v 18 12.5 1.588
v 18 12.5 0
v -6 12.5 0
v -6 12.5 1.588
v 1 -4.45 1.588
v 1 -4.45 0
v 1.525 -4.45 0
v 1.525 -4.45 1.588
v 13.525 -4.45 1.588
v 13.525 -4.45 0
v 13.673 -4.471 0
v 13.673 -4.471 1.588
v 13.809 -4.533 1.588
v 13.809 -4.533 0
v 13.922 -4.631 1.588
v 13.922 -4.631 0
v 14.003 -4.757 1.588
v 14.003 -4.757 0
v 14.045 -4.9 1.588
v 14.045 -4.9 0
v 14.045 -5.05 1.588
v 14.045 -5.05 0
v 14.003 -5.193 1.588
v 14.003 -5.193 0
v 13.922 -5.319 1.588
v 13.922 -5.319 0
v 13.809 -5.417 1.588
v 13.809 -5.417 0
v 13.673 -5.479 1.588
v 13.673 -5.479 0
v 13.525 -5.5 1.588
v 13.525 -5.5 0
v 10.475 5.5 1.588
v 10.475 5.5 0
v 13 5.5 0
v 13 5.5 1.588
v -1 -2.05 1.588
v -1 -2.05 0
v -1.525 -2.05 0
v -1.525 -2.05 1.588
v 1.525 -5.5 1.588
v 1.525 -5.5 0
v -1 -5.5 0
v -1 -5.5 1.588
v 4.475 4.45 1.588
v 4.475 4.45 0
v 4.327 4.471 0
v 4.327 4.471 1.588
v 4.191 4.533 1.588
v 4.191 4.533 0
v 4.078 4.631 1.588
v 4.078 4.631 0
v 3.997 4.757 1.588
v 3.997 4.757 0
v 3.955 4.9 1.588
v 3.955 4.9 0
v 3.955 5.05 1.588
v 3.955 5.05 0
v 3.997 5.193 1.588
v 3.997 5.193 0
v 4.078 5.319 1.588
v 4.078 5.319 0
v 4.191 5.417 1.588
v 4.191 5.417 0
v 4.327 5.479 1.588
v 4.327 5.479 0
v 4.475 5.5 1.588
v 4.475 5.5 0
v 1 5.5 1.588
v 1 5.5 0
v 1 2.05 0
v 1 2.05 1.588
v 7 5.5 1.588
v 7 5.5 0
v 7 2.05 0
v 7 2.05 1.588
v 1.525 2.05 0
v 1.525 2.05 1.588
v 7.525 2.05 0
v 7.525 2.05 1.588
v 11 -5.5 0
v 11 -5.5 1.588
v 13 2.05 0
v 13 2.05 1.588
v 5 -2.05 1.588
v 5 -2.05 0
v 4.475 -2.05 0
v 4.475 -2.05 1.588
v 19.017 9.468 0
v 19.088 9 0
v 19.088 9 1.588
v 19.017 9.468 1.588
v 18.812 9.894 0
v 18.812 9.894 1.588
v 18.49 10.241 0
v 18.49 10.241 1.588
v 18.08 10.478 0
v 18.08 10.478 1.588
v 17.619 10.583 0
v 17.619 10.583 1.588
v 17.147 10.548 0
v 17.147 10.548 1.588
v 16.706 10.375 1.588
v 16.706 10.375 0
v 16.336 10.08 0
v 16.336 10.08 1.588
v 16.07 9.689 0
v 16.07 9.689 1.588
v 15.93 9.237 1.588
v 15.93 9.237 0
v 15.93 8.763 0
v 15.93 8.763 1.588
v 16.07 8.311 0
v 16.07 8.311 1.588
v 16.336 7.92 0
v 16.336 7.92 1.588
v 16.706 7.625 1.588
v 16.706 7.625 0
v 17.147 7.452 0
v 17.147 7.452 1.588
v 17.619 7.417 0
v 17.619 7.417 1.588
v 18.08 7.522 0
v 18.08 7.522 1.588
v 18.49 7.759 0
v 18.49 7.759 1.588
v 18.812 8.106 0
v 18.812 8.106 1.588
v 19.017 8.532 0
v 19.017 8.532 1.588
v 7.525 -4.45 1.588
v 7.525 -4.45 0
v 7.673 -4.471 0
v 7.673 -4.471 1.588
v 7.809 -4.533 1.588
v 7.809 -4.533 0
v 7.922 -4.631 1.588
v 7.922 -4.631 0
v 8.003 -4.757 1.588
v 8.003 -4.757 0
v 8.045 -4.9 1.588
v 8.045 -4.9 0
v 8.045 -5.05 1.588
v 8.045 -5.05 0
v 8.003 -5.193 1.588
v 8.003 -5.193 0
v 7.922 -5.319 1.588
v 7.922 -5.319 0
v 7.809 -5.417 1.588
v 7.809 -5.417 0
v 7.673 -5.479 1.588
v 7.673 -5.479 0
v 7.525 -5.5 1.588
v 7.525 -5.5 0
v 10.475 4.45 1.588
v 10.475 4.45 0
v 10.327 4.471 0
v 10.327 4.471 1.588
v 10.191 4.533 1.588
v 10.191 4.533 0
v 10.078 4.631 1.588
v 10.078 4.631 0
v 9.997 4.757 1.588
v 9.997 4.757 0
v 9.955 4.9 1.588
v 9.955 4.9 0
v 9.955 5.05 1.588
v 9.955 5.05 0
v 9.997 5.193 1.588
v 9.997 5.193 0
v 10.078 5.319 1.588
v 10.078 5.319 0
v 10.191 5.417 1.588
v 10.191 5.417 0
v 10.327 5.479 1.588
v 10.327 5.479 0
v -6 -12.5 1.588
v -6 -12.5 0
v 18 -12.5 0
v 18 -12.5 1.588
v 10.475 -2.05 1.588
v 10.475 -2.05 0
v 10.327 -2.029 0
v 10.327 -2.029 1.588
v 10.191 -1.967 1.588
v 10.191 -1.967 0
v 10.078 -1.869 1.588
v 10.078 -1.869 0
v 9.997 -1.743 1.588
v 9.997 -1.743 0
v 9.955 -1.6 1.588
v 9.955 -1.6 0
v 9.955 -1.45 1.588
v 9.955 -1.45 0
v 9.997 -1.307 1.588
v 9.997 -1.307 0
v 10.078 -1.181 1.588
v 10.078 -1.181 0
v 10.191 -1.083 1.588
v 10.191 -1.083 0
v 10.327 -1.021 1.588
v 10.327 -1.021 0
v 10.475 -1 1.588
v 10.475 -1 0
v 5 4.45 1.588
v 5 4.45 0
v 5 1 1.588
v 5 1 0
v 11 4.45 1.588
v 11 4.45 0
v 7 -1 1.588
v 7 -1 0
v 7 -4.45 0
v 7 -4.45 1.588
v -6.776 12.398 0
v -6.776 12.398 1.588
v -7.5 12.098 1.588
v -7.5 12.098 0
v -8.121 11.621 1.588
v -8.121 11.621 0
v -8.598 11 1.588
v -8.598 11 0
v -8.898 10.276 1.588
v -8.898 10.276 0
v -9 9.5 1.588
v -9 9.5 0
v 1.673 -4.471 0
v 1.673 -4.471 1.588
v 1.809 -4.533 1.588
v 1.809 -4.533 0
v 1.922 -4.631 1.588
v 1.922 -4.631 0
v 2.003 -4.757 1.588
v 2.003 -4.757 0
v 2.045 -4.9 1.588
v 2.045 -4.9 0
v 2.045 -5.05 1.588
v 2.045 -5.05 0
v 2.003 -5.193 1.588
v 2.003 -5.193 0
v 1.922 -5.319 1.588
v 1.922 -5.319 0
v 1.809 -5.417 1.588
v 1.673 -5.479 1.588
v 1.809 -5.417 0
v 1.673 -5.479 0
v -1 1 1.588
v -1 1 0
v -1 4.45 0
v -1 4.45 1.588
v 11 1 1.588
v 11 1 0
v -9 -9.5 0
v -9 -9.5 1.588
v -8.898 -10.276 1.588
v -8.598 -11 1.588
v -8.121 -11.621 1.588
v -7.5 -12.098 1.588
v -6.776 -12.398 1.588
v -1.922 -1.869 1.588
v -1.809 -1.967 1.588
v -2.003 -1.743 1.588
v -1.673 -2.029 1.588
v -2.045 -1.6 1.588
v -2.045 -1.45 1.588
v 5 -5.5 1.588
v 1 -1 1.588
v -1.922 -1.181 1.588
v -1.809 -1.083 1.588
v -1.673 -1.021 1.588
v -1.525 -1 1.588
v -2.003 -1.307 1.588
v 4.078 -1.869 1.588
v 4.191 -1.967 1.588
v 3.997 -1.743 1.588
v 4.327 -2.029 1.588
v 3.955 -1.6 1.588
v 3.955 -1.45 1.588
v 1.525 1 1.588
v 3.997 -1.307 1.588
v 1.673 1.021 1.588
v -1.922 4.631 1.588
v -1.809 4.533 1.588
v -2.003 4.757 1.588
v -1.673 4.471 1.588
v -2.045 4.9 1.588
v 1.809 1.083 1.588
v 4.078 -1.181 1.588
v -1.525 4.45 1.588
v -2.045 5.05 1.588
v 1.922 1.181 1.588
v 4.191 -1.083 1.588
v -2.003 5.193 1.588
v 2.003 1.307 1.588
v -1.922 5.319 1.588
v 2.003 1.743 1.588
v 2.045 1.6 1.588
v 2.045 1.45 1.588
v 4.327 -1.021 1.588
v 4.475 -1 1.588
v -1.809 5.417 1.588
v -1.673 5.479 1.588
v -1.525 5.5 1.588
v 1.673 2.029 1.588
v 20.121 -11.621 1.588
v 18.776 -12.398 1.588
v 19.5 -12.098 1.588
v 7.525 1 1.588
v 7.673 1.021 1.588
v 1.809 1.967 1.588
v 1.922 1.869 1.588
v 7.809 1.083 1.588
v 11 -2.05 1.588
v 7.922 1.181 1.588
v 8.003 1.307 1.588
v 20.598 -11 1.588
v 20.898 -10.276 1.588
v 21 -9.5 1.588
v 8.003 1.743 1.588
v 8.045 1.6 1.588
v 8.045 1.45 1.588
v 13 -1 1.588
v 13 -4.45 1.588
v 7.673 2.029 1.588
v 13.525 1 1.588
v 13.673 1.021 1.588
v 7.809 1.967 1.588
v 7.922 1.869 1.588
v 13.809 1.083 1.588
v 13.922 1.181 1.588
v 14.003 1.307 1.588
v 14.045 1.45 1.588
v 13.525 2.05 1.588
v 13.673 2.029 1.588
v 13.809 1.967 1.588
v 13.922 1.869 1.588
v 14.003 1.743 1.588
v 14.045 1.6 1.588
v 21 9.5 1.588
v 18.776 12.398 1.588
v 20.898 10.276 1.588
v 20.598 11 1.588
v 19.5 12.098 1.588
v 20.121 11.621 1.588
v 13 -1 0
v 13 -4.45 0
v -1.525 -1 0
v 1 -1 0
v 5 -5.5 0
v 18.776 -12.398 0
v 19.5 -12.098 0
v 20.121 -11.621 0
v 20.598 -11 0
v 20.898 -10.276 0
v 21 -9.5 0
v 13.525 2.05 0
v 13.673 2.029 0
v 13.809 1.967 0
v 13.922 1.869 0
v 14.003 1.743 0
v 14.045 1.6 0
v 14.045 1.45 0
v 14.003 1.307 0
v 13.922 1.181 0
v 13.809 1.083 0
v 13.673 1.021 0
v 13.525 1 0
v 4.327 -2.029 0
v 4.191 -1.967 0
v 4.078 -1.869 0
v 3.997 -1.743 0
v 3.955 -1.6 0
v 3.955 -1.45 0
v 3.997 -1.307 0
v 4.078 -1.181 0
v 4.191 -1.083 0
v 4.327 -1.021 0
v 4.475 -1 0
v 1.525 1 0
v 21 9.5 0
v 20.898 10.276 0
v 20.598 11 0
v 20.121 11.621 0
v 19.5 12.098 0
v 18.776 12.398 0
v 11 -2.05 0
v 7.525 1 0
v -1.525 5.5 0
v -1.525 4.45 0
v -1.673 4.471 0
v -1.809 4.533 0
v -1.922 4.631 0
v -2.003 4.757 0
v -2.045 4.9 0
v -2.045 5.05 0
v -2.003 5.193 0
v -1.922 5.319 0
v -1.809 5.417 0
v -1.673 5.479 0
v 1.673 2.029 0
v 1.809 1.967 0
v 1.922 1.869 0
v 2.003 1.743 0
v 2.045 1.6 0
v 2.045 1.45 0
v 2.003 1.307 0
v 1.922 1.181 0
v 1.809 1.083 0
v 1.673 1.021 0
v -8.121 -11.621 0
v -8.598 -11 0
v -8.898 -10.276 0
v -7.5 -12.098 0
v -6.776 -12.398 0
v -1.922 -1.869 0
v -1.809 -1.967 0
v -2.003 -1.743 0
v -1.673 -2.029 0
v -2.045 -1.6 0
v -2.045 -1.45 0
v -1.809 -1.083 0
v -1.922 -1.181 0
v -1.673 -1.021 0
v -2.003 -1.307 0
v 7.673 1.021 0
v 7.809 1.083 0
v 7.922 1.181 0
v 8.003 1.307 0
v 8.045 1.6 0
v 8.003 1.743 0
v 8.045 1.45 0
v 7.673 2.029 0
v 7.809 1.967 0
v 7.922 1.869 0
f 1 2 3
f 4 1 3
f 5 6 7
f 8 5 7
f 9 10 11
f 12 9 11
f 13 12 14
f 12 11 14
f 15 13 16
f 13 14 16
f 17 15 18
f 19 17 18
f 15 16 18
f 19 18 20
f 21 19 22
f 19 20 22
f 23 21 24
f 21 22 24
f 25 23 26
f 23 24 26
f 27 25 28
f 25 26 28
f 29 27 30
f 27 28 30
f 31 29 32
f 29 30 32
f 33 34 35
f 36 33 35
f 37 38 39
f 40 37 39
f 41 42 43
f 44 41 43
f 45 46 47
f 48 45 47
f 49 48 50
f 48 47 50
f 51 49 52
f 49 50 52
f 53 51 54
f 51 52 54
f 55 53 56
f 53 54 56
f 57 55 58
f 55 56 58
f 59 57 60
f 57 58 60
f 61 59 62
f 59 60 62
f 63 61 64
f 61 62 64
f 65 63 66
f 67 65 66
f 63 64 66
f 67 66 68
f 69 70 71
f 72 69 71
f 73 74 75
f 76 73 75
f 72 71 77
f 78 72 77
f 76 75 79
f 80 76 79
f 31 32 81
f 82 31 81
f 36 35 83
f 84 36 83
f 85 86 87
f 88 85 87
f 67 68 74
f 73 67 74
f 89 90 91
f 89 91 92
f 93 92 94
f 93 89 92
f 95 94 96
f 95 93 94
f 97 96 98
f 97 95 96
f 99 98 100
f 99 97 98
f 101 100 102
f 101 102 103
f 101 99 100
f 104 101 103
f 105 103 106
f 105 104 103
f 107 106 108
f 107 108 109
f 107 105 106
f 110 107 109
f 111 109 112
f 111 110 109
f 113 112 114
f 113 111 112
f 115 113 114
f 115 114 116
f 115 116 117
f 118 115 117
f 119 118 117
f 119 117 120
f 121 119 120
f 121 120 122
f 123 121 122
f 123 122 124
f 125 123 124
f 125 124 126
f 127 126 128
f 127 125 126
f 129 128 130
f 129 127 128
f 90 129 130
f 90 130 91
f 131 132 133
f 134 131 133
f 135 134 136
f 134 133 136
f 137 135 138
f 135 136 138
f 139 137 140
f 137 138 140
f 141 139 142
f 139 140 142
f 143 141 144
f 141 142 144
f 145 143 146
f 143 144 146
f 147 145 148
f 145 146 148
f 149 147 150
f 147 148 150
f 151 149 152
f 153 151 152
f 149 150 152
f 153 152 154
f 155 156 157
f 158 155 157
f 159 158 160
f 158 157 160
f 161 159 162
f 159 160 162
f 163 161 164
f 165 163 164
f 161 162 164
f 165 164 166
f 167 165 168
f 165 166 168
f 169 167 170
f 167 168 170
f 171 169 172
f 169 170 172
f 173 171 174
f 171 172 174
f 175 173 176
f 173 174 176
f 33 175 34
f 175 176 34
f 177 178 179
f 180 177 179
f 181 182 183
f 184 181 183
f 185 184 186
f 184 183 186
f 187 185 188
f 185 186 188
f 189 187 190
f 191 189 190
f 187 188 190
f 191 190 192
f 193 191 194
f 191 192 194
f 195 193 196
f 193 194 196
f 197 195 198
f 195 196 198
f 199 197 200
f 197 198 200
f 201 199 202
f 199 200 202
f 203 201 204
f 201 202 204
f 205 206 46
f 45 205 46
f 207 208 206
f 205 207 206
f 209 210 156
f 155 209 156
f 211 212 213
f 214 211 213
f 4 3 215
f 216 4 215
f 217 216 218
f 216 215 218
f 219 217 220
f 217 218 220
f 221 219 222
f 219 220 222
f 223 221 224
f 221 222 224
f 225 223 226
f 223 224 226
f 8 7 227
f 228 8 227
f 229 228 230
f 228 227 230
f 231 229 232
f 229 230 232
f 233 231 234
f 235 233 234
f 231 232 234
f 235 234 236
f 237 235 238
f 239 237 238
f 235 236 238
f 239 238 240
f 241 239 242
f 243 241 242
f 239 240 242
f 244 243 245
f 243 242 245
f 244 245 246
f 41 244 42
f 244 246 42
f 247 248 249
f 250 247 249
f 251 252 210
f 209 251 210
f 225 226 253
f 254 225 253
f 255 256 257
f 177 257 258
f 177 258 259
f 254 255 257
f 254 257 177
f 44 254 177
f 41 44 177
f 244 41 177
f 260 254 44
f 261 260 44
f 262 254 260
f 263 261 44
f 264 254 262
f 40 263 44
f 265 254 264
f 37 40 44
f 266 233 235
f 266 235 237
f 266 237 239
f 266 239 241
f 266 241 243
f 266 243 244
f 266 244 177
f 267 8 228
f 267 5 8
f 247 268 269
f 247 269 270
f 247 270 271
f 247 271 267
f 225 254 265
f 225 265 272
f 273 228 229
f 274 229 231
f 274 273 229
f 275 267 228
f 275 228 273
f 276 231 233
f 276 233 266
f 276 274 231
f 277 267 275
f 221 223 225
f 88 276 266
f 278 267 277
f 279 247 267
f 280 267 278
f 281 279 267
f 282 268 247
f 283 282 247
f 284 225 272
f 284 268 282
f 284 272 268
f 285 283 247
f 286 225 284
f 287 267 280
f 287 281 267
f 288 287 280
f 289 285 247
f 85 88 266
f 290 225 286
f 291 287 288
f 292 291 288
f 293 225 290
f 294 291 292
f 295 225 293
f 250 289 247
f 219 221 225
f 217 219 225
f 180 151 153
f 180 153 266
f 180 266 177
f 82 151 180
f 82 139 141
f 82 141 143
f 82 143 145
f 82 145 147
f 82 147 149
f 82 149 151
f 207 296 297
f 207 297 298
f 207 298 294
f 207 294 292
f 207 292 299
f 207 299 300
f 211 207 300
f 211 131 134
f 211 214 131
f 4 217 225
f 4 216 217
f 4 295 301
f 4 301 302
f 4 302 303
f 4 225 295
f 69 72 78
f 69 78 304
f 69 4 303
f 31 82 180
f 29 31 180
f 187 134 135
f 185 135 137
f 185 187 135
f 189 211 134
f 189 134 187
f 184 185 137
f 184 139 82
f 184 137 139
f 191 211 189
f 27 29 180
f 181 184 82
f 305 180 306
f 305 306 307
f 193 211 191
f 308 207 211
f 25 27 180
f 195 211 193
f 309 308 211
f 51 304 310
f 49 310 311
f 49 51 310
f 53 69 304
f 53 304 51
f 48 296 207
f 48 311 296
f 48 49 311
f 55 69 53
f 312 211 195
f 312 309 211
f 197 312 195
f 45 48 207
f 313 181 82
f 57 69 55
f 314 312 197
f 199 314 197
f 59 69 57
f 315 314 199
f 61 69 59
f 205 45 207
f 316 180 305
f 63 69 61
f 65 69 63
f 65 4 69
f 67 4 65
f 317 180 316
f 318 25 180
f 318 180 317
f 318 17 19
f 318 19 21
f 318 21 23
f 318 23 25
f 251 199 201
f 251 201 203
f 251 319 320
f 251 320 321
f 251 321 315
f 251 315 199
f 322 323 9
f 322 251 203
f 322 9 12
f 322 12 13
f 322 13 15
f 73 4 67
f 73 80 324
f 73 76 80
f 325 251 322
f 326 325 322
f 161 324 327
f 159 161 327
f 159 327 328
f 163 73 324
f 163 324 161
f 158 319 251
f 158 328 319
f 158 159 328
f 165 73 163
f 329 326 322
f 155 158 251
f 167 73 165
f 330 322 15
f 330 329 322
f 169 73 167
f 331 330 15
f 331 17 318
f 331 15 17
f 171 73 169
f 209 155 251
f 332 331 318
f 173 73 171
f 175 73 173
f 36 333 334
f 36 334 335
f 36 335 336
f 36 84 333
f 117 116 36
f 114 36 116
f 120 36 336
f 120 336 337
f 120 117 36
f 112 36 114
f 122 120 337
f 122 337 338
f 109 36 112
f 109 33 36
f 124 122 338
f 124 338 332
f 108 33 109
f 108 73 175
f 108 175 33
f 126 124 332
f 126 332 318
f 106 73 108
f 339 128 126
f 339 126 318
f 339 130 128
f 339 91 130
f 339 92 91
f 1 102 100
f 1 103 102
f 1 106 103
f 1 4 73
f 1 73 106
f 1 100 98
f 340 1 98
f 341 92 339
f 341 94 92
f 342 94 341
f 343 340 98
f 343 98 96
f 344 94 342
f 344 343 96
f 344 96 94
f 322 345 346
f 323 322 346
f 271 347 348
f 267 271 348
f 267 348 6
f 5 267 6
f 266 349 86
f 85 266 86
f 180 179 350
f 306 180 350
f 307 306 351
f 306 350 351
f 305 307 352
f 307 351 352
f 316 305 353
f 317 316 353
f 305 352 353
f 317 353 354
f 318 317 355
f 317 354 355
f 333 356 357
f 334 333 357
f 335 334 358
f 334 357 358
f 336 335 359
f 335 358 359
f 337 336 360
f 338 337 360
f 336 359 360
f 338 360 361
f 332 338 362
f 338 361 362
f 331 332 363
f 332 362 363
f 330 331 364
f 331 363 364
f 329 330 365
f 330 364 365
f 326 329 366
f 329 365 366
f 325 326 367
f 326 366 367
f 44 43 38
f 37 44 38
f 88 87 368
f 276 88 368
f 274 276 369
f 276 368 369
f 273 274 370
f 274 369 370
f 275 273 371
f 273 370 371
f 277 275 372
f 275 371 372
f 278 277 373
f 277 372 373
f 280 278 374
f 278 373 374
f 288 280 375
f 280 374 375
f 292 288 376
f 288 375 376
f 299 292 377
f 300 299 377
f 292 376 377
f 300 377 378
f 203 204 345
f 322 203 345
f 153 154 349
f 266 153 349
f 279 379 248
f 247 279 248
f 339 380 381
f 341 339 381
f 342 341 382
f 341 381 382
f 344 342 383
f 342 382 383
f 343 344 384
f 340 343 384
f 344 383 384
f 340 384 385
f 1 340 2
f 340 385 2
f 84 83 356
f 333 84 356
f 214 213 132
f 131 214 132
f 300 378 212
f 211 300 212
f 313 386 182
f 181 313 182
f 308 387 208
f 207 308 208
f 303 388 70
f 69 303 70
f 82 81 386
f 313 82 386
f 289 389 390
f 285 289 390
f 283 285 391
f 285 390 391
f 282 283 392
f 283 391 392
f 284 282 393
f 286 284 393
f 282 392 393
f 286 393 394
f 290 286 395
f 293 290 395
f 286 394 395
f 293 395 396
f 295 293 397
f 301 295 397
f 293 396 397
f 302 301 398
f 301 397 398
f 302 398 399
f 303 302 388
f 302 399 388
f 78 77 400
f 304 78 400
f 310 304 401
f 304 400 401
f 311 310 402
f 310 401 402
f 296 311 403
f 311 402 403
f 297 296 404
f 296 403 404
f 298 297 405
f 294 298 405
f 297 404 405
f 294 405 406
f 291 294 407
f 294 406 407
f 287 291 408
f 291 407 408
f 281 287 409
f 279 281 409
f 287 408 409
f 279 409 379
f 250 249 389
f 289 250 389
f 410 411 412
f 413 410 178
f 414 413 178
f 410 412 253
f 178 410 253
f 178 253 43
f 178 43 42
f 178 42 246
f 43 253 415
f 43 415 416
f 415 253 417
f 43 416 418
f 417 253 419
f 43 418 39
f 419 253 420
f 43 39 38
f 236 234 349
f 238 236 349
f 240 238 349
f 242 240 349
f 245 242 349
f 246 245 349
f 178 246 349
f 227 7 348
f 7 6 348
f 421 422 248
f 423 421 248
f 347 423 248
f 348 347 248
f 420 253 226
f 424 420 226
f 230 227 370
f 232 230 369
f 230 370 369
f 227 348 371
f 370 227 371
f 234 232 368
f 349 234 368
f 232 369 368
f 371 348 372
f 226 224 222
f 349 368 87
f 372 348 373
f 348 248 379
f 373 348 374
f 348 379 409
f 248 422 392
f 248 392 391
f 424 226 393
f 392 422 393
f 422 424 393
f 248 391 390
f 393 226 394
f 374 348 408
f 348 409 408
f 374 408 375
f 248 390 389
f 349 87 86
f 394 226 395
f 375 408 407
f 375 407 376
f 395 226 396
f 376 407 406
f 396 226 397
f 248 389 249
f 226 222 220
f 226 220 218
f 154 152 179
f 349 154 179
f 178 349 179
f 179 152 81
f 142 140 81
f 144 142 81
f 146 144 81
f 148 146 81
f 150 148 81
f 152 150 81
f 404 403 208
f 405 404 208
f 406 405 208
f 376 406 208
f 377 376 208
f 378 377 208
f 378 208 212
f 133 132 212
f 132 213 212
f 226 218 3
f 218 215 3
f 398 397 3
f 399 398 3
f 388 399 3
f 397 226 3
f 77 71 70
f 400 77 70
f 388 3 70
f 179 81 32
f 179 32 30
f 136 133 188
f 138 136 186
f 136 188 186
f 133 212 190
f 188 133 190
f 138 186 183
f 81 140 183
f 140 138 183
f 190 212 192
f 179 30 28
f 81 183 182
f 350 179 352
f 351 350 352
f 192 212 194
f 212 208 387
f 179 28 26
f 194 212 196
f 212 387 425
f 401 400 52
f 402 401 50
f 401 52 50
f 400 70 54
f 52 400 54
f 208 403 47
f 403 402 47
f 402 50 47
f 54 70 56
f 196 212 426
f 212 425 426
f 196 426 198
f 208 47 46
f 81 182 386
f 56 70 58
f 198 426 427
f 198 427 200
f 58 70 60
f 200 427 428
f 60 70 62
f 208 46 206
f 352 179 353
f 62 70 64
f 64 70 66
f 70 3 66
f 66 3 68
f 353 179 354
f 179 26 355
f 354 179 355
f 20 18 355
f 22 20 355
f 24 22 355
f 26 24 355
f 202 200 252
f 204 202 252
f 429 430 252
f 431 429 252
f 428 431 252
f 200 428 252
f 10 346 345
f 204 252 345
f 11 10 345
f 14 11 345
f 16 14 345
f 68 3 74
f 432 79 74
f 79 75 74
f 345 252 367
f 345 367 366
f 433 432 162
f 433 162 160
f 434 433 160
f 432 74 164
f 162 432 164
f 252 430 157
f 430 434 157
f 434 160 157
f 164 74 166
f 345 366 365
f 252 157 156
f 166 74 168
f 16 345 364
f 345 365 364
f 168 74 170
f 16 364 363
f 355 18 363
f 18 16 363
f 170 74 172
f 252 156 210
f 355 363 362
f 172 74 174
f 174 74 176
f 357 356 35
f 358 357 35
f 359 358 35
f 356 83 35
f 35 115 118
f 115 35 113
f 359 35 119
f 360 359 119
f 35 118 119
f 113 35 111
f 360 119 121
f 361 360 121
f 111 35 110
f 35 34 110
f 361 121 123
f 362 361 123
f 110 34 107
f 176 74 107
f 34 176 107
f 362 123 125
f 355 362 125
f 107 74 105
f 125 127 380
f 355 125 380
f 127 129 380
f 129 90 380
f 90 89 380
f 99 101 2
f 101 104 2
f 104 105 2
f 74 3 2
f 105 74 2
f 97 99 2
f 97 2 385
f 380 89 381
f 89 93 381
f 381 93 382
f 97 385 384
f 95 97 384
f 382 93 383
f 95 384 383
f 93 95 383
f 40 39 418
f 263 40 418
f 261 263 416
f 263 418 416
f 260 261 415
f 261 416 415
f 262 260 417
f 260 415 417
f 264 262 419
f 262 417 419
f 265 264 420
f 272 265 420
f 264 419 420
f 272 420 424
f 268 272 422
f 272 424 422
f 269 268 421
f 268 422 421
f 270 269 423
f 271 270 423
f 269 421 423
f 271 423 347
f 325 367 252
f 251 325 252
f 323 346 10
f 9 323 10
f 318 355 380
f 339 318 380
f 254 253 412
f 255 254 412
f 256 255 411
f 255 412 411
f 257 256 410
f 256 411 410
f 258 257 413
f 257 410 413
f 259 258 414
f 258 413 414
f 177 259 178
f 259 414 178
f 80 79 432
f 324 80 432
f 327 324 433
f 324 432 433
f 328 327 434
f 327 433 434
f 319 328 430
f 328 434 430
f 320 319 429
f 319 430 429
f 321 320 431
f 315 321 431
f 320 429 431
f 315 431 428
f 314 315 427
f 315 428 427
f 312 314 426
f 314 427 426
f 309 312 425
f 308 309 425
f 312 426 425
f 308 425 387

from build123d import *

# Parameters (mm, degrees)
F0_R     = 1.5875
F1_DEPTH = 1.5875


# Not quite as in the source:
# - a length typed as a fraction of an inch, garbled in the dataset ("3 / 203.2 mm" for 3/8 in), is restored


with BuildPart() as f1:
    # F0 (on Top) → F1 (new body)
    with BuildSketch(Plane.XY):
        with BuildLine():
            Line((-6, -12.5), (18, -12.5))
            ThreePointArc((18, -12.5), (20.1213203436, -11.6213203436), (21, -9.5))
            Line((21, -9.5), (21, 9.5))
            ThreePointArc((21, 9.5), (20.1213203436, 11.6213203436), (18, 12.5))
            Line((18, 12.5), (-6, 12.5))
            ThreePointArc((-6, 12.5), (-8.1213203436, 11.6213203436), (-9, 9.5))
            Line((-9, 9.5), (-9, -9.5))
            ThreePointArc((-9, -9.5), (-8.1213203436, -11.6213203436), (-6, -12.5))
        make_face()
        with BuildLine():
            Line((1.525, -5.5), (1, -5.5))
            Line((1, -5.5), (-1, -5.5))
            Line((-1, -5.5), (-1, -2.05))
            Line((-1, -2.05), (-1.525, -2.05))
            ThreePointArc((-1.525, -2.05), (-2.05, -1.525), (-1.525, -1))
            Line((-1.525, -1), (-1, -1))
            Line((-1, -1), (1, -1))
            Line((1, -1), (1, -4.45))
            Line((1, -4.45), (1.525, -4.45))
            ThreePointArc((1.525, -4.45), (2.05, -4.975), (1.525, -5.5))
        make_face(mode=Mode.SUBTRACT)
        with BuildLine():
            Line((7.525, -5.5), (7, -5.5))
            Line((7, -5.5), (5, -5.5))
            Line((5, -5.5), (5, -2.05))
            Line((5, -2.05), (4.475, -2.05))
            ThreePointArc((4.475, -2.05), (3.95, -1.525), (4.475, -1))
            Line((4.475, -1), (5, -1))
            Line((5, -1), (7, -1))
            Line((7, -1), (7, -4.45))
            Line((7, -4.45), (7.525, -4.45))
            ThreePointArc((7.525, -4.45), (8.05, -4.975), (7.525, -5.5))
        make_face(mode=Mode.SUBTRACT)
        with BuildLine():
            Line((13.525, -5.5), (13, -5.5))
            Line((13, -5.5), (11, -5.5))
            Line((11, -5.5), (11, -2.05))
            Line((11, -2.05), (10.475, -2.05))
            ThreePointArc((10.475, -2.05), (9.95, -1.525), (10.475, -1))
            Line((10.475, -1), (11, -1))
            Line((11, -1), (13, -1))
            Line((13, -1), (13, -4.45))
            Line((13, -4.45), (13.525, -4.45))
            ThreePointArc((13.525, -4.45), (14.05, -4.975), (13.525, -5.5))
        make_face(mode=Mode.SUBTRACT)
        with BuildLine():
            Line((-1, 5.5), (1, 5.5))
            Line((1, 5.5), (1, 2.05))
            Line((1, 2.05), (1.525, 2.05))
            ThreePointArc((1.525, 2.05), (2.05, 1.525), (1.525, 1))
            Line((1.525, 1), (1, 1))
            Line((1, 1), (-1, 1))
            Line((-1, 1), (-1, 4.45))
            Line((-1, 4.45), (-1.525, 4.45))
            ThreePointArc((-1.525, 4.45), (-2.05, 4.975), (-1.525, 5.5))
            Line((-1.525, 5.5), (-1, 5.5))
        make_face(mode=Mode.SUBTRACT)
        with BuildLine():
            Line((7.525, 1), (7, 1))
            Line((7, 1), (5, 1))
            Line((5, 1), (5, 4.45))
            Line((5, 4.45), (4.475, 4.45))
            ThreePointArc((4.475, 4.45), (3.95, 4.975), (4.475, 5.5))
            Line((4.475, 5.5), (5, 5.5))
            Line((5, 5.5), (7, 5.5))
            Line((7, 5.5), (7, 2.05))
            Line((7, 2.05), (7.525, 2.05))
            ThreePointArc((7.525, 2.05), (8.05, 1.525), (7.525, 1))
        make_face(mode=Mode.SUBTRACT)
        with BuildLine():
            Line((13.525, 1), (13, 1))
            Line((13, 1), (11, 1))
            Line((11, 1), (11, 4.45))
            Line((11, 4.45), (10.475, 4.45))
            ThreePointArc((10.475, 4.45), (9.95, 4.975), (10.475, 5.5))
            Line((10.475, 5.5), (11, 5.5))
            Line((11, 5.5), (13, 5.5))
            Line((13, 5.5), (13, 2.05))
            Line((13, 2.05), (13.525, 2.05))
            ThreePointArc((13.525, 2.05), (14.05, 1.525), (13.525, 1))
        make_face(mode=Mode.SUBTRACT)
        with Locations((17.5, 9)):
            Circle(F0_R, mode=Mode.SUBTRACT)
    extrude(amount=F1_DEPTH)


solid = f1.part
